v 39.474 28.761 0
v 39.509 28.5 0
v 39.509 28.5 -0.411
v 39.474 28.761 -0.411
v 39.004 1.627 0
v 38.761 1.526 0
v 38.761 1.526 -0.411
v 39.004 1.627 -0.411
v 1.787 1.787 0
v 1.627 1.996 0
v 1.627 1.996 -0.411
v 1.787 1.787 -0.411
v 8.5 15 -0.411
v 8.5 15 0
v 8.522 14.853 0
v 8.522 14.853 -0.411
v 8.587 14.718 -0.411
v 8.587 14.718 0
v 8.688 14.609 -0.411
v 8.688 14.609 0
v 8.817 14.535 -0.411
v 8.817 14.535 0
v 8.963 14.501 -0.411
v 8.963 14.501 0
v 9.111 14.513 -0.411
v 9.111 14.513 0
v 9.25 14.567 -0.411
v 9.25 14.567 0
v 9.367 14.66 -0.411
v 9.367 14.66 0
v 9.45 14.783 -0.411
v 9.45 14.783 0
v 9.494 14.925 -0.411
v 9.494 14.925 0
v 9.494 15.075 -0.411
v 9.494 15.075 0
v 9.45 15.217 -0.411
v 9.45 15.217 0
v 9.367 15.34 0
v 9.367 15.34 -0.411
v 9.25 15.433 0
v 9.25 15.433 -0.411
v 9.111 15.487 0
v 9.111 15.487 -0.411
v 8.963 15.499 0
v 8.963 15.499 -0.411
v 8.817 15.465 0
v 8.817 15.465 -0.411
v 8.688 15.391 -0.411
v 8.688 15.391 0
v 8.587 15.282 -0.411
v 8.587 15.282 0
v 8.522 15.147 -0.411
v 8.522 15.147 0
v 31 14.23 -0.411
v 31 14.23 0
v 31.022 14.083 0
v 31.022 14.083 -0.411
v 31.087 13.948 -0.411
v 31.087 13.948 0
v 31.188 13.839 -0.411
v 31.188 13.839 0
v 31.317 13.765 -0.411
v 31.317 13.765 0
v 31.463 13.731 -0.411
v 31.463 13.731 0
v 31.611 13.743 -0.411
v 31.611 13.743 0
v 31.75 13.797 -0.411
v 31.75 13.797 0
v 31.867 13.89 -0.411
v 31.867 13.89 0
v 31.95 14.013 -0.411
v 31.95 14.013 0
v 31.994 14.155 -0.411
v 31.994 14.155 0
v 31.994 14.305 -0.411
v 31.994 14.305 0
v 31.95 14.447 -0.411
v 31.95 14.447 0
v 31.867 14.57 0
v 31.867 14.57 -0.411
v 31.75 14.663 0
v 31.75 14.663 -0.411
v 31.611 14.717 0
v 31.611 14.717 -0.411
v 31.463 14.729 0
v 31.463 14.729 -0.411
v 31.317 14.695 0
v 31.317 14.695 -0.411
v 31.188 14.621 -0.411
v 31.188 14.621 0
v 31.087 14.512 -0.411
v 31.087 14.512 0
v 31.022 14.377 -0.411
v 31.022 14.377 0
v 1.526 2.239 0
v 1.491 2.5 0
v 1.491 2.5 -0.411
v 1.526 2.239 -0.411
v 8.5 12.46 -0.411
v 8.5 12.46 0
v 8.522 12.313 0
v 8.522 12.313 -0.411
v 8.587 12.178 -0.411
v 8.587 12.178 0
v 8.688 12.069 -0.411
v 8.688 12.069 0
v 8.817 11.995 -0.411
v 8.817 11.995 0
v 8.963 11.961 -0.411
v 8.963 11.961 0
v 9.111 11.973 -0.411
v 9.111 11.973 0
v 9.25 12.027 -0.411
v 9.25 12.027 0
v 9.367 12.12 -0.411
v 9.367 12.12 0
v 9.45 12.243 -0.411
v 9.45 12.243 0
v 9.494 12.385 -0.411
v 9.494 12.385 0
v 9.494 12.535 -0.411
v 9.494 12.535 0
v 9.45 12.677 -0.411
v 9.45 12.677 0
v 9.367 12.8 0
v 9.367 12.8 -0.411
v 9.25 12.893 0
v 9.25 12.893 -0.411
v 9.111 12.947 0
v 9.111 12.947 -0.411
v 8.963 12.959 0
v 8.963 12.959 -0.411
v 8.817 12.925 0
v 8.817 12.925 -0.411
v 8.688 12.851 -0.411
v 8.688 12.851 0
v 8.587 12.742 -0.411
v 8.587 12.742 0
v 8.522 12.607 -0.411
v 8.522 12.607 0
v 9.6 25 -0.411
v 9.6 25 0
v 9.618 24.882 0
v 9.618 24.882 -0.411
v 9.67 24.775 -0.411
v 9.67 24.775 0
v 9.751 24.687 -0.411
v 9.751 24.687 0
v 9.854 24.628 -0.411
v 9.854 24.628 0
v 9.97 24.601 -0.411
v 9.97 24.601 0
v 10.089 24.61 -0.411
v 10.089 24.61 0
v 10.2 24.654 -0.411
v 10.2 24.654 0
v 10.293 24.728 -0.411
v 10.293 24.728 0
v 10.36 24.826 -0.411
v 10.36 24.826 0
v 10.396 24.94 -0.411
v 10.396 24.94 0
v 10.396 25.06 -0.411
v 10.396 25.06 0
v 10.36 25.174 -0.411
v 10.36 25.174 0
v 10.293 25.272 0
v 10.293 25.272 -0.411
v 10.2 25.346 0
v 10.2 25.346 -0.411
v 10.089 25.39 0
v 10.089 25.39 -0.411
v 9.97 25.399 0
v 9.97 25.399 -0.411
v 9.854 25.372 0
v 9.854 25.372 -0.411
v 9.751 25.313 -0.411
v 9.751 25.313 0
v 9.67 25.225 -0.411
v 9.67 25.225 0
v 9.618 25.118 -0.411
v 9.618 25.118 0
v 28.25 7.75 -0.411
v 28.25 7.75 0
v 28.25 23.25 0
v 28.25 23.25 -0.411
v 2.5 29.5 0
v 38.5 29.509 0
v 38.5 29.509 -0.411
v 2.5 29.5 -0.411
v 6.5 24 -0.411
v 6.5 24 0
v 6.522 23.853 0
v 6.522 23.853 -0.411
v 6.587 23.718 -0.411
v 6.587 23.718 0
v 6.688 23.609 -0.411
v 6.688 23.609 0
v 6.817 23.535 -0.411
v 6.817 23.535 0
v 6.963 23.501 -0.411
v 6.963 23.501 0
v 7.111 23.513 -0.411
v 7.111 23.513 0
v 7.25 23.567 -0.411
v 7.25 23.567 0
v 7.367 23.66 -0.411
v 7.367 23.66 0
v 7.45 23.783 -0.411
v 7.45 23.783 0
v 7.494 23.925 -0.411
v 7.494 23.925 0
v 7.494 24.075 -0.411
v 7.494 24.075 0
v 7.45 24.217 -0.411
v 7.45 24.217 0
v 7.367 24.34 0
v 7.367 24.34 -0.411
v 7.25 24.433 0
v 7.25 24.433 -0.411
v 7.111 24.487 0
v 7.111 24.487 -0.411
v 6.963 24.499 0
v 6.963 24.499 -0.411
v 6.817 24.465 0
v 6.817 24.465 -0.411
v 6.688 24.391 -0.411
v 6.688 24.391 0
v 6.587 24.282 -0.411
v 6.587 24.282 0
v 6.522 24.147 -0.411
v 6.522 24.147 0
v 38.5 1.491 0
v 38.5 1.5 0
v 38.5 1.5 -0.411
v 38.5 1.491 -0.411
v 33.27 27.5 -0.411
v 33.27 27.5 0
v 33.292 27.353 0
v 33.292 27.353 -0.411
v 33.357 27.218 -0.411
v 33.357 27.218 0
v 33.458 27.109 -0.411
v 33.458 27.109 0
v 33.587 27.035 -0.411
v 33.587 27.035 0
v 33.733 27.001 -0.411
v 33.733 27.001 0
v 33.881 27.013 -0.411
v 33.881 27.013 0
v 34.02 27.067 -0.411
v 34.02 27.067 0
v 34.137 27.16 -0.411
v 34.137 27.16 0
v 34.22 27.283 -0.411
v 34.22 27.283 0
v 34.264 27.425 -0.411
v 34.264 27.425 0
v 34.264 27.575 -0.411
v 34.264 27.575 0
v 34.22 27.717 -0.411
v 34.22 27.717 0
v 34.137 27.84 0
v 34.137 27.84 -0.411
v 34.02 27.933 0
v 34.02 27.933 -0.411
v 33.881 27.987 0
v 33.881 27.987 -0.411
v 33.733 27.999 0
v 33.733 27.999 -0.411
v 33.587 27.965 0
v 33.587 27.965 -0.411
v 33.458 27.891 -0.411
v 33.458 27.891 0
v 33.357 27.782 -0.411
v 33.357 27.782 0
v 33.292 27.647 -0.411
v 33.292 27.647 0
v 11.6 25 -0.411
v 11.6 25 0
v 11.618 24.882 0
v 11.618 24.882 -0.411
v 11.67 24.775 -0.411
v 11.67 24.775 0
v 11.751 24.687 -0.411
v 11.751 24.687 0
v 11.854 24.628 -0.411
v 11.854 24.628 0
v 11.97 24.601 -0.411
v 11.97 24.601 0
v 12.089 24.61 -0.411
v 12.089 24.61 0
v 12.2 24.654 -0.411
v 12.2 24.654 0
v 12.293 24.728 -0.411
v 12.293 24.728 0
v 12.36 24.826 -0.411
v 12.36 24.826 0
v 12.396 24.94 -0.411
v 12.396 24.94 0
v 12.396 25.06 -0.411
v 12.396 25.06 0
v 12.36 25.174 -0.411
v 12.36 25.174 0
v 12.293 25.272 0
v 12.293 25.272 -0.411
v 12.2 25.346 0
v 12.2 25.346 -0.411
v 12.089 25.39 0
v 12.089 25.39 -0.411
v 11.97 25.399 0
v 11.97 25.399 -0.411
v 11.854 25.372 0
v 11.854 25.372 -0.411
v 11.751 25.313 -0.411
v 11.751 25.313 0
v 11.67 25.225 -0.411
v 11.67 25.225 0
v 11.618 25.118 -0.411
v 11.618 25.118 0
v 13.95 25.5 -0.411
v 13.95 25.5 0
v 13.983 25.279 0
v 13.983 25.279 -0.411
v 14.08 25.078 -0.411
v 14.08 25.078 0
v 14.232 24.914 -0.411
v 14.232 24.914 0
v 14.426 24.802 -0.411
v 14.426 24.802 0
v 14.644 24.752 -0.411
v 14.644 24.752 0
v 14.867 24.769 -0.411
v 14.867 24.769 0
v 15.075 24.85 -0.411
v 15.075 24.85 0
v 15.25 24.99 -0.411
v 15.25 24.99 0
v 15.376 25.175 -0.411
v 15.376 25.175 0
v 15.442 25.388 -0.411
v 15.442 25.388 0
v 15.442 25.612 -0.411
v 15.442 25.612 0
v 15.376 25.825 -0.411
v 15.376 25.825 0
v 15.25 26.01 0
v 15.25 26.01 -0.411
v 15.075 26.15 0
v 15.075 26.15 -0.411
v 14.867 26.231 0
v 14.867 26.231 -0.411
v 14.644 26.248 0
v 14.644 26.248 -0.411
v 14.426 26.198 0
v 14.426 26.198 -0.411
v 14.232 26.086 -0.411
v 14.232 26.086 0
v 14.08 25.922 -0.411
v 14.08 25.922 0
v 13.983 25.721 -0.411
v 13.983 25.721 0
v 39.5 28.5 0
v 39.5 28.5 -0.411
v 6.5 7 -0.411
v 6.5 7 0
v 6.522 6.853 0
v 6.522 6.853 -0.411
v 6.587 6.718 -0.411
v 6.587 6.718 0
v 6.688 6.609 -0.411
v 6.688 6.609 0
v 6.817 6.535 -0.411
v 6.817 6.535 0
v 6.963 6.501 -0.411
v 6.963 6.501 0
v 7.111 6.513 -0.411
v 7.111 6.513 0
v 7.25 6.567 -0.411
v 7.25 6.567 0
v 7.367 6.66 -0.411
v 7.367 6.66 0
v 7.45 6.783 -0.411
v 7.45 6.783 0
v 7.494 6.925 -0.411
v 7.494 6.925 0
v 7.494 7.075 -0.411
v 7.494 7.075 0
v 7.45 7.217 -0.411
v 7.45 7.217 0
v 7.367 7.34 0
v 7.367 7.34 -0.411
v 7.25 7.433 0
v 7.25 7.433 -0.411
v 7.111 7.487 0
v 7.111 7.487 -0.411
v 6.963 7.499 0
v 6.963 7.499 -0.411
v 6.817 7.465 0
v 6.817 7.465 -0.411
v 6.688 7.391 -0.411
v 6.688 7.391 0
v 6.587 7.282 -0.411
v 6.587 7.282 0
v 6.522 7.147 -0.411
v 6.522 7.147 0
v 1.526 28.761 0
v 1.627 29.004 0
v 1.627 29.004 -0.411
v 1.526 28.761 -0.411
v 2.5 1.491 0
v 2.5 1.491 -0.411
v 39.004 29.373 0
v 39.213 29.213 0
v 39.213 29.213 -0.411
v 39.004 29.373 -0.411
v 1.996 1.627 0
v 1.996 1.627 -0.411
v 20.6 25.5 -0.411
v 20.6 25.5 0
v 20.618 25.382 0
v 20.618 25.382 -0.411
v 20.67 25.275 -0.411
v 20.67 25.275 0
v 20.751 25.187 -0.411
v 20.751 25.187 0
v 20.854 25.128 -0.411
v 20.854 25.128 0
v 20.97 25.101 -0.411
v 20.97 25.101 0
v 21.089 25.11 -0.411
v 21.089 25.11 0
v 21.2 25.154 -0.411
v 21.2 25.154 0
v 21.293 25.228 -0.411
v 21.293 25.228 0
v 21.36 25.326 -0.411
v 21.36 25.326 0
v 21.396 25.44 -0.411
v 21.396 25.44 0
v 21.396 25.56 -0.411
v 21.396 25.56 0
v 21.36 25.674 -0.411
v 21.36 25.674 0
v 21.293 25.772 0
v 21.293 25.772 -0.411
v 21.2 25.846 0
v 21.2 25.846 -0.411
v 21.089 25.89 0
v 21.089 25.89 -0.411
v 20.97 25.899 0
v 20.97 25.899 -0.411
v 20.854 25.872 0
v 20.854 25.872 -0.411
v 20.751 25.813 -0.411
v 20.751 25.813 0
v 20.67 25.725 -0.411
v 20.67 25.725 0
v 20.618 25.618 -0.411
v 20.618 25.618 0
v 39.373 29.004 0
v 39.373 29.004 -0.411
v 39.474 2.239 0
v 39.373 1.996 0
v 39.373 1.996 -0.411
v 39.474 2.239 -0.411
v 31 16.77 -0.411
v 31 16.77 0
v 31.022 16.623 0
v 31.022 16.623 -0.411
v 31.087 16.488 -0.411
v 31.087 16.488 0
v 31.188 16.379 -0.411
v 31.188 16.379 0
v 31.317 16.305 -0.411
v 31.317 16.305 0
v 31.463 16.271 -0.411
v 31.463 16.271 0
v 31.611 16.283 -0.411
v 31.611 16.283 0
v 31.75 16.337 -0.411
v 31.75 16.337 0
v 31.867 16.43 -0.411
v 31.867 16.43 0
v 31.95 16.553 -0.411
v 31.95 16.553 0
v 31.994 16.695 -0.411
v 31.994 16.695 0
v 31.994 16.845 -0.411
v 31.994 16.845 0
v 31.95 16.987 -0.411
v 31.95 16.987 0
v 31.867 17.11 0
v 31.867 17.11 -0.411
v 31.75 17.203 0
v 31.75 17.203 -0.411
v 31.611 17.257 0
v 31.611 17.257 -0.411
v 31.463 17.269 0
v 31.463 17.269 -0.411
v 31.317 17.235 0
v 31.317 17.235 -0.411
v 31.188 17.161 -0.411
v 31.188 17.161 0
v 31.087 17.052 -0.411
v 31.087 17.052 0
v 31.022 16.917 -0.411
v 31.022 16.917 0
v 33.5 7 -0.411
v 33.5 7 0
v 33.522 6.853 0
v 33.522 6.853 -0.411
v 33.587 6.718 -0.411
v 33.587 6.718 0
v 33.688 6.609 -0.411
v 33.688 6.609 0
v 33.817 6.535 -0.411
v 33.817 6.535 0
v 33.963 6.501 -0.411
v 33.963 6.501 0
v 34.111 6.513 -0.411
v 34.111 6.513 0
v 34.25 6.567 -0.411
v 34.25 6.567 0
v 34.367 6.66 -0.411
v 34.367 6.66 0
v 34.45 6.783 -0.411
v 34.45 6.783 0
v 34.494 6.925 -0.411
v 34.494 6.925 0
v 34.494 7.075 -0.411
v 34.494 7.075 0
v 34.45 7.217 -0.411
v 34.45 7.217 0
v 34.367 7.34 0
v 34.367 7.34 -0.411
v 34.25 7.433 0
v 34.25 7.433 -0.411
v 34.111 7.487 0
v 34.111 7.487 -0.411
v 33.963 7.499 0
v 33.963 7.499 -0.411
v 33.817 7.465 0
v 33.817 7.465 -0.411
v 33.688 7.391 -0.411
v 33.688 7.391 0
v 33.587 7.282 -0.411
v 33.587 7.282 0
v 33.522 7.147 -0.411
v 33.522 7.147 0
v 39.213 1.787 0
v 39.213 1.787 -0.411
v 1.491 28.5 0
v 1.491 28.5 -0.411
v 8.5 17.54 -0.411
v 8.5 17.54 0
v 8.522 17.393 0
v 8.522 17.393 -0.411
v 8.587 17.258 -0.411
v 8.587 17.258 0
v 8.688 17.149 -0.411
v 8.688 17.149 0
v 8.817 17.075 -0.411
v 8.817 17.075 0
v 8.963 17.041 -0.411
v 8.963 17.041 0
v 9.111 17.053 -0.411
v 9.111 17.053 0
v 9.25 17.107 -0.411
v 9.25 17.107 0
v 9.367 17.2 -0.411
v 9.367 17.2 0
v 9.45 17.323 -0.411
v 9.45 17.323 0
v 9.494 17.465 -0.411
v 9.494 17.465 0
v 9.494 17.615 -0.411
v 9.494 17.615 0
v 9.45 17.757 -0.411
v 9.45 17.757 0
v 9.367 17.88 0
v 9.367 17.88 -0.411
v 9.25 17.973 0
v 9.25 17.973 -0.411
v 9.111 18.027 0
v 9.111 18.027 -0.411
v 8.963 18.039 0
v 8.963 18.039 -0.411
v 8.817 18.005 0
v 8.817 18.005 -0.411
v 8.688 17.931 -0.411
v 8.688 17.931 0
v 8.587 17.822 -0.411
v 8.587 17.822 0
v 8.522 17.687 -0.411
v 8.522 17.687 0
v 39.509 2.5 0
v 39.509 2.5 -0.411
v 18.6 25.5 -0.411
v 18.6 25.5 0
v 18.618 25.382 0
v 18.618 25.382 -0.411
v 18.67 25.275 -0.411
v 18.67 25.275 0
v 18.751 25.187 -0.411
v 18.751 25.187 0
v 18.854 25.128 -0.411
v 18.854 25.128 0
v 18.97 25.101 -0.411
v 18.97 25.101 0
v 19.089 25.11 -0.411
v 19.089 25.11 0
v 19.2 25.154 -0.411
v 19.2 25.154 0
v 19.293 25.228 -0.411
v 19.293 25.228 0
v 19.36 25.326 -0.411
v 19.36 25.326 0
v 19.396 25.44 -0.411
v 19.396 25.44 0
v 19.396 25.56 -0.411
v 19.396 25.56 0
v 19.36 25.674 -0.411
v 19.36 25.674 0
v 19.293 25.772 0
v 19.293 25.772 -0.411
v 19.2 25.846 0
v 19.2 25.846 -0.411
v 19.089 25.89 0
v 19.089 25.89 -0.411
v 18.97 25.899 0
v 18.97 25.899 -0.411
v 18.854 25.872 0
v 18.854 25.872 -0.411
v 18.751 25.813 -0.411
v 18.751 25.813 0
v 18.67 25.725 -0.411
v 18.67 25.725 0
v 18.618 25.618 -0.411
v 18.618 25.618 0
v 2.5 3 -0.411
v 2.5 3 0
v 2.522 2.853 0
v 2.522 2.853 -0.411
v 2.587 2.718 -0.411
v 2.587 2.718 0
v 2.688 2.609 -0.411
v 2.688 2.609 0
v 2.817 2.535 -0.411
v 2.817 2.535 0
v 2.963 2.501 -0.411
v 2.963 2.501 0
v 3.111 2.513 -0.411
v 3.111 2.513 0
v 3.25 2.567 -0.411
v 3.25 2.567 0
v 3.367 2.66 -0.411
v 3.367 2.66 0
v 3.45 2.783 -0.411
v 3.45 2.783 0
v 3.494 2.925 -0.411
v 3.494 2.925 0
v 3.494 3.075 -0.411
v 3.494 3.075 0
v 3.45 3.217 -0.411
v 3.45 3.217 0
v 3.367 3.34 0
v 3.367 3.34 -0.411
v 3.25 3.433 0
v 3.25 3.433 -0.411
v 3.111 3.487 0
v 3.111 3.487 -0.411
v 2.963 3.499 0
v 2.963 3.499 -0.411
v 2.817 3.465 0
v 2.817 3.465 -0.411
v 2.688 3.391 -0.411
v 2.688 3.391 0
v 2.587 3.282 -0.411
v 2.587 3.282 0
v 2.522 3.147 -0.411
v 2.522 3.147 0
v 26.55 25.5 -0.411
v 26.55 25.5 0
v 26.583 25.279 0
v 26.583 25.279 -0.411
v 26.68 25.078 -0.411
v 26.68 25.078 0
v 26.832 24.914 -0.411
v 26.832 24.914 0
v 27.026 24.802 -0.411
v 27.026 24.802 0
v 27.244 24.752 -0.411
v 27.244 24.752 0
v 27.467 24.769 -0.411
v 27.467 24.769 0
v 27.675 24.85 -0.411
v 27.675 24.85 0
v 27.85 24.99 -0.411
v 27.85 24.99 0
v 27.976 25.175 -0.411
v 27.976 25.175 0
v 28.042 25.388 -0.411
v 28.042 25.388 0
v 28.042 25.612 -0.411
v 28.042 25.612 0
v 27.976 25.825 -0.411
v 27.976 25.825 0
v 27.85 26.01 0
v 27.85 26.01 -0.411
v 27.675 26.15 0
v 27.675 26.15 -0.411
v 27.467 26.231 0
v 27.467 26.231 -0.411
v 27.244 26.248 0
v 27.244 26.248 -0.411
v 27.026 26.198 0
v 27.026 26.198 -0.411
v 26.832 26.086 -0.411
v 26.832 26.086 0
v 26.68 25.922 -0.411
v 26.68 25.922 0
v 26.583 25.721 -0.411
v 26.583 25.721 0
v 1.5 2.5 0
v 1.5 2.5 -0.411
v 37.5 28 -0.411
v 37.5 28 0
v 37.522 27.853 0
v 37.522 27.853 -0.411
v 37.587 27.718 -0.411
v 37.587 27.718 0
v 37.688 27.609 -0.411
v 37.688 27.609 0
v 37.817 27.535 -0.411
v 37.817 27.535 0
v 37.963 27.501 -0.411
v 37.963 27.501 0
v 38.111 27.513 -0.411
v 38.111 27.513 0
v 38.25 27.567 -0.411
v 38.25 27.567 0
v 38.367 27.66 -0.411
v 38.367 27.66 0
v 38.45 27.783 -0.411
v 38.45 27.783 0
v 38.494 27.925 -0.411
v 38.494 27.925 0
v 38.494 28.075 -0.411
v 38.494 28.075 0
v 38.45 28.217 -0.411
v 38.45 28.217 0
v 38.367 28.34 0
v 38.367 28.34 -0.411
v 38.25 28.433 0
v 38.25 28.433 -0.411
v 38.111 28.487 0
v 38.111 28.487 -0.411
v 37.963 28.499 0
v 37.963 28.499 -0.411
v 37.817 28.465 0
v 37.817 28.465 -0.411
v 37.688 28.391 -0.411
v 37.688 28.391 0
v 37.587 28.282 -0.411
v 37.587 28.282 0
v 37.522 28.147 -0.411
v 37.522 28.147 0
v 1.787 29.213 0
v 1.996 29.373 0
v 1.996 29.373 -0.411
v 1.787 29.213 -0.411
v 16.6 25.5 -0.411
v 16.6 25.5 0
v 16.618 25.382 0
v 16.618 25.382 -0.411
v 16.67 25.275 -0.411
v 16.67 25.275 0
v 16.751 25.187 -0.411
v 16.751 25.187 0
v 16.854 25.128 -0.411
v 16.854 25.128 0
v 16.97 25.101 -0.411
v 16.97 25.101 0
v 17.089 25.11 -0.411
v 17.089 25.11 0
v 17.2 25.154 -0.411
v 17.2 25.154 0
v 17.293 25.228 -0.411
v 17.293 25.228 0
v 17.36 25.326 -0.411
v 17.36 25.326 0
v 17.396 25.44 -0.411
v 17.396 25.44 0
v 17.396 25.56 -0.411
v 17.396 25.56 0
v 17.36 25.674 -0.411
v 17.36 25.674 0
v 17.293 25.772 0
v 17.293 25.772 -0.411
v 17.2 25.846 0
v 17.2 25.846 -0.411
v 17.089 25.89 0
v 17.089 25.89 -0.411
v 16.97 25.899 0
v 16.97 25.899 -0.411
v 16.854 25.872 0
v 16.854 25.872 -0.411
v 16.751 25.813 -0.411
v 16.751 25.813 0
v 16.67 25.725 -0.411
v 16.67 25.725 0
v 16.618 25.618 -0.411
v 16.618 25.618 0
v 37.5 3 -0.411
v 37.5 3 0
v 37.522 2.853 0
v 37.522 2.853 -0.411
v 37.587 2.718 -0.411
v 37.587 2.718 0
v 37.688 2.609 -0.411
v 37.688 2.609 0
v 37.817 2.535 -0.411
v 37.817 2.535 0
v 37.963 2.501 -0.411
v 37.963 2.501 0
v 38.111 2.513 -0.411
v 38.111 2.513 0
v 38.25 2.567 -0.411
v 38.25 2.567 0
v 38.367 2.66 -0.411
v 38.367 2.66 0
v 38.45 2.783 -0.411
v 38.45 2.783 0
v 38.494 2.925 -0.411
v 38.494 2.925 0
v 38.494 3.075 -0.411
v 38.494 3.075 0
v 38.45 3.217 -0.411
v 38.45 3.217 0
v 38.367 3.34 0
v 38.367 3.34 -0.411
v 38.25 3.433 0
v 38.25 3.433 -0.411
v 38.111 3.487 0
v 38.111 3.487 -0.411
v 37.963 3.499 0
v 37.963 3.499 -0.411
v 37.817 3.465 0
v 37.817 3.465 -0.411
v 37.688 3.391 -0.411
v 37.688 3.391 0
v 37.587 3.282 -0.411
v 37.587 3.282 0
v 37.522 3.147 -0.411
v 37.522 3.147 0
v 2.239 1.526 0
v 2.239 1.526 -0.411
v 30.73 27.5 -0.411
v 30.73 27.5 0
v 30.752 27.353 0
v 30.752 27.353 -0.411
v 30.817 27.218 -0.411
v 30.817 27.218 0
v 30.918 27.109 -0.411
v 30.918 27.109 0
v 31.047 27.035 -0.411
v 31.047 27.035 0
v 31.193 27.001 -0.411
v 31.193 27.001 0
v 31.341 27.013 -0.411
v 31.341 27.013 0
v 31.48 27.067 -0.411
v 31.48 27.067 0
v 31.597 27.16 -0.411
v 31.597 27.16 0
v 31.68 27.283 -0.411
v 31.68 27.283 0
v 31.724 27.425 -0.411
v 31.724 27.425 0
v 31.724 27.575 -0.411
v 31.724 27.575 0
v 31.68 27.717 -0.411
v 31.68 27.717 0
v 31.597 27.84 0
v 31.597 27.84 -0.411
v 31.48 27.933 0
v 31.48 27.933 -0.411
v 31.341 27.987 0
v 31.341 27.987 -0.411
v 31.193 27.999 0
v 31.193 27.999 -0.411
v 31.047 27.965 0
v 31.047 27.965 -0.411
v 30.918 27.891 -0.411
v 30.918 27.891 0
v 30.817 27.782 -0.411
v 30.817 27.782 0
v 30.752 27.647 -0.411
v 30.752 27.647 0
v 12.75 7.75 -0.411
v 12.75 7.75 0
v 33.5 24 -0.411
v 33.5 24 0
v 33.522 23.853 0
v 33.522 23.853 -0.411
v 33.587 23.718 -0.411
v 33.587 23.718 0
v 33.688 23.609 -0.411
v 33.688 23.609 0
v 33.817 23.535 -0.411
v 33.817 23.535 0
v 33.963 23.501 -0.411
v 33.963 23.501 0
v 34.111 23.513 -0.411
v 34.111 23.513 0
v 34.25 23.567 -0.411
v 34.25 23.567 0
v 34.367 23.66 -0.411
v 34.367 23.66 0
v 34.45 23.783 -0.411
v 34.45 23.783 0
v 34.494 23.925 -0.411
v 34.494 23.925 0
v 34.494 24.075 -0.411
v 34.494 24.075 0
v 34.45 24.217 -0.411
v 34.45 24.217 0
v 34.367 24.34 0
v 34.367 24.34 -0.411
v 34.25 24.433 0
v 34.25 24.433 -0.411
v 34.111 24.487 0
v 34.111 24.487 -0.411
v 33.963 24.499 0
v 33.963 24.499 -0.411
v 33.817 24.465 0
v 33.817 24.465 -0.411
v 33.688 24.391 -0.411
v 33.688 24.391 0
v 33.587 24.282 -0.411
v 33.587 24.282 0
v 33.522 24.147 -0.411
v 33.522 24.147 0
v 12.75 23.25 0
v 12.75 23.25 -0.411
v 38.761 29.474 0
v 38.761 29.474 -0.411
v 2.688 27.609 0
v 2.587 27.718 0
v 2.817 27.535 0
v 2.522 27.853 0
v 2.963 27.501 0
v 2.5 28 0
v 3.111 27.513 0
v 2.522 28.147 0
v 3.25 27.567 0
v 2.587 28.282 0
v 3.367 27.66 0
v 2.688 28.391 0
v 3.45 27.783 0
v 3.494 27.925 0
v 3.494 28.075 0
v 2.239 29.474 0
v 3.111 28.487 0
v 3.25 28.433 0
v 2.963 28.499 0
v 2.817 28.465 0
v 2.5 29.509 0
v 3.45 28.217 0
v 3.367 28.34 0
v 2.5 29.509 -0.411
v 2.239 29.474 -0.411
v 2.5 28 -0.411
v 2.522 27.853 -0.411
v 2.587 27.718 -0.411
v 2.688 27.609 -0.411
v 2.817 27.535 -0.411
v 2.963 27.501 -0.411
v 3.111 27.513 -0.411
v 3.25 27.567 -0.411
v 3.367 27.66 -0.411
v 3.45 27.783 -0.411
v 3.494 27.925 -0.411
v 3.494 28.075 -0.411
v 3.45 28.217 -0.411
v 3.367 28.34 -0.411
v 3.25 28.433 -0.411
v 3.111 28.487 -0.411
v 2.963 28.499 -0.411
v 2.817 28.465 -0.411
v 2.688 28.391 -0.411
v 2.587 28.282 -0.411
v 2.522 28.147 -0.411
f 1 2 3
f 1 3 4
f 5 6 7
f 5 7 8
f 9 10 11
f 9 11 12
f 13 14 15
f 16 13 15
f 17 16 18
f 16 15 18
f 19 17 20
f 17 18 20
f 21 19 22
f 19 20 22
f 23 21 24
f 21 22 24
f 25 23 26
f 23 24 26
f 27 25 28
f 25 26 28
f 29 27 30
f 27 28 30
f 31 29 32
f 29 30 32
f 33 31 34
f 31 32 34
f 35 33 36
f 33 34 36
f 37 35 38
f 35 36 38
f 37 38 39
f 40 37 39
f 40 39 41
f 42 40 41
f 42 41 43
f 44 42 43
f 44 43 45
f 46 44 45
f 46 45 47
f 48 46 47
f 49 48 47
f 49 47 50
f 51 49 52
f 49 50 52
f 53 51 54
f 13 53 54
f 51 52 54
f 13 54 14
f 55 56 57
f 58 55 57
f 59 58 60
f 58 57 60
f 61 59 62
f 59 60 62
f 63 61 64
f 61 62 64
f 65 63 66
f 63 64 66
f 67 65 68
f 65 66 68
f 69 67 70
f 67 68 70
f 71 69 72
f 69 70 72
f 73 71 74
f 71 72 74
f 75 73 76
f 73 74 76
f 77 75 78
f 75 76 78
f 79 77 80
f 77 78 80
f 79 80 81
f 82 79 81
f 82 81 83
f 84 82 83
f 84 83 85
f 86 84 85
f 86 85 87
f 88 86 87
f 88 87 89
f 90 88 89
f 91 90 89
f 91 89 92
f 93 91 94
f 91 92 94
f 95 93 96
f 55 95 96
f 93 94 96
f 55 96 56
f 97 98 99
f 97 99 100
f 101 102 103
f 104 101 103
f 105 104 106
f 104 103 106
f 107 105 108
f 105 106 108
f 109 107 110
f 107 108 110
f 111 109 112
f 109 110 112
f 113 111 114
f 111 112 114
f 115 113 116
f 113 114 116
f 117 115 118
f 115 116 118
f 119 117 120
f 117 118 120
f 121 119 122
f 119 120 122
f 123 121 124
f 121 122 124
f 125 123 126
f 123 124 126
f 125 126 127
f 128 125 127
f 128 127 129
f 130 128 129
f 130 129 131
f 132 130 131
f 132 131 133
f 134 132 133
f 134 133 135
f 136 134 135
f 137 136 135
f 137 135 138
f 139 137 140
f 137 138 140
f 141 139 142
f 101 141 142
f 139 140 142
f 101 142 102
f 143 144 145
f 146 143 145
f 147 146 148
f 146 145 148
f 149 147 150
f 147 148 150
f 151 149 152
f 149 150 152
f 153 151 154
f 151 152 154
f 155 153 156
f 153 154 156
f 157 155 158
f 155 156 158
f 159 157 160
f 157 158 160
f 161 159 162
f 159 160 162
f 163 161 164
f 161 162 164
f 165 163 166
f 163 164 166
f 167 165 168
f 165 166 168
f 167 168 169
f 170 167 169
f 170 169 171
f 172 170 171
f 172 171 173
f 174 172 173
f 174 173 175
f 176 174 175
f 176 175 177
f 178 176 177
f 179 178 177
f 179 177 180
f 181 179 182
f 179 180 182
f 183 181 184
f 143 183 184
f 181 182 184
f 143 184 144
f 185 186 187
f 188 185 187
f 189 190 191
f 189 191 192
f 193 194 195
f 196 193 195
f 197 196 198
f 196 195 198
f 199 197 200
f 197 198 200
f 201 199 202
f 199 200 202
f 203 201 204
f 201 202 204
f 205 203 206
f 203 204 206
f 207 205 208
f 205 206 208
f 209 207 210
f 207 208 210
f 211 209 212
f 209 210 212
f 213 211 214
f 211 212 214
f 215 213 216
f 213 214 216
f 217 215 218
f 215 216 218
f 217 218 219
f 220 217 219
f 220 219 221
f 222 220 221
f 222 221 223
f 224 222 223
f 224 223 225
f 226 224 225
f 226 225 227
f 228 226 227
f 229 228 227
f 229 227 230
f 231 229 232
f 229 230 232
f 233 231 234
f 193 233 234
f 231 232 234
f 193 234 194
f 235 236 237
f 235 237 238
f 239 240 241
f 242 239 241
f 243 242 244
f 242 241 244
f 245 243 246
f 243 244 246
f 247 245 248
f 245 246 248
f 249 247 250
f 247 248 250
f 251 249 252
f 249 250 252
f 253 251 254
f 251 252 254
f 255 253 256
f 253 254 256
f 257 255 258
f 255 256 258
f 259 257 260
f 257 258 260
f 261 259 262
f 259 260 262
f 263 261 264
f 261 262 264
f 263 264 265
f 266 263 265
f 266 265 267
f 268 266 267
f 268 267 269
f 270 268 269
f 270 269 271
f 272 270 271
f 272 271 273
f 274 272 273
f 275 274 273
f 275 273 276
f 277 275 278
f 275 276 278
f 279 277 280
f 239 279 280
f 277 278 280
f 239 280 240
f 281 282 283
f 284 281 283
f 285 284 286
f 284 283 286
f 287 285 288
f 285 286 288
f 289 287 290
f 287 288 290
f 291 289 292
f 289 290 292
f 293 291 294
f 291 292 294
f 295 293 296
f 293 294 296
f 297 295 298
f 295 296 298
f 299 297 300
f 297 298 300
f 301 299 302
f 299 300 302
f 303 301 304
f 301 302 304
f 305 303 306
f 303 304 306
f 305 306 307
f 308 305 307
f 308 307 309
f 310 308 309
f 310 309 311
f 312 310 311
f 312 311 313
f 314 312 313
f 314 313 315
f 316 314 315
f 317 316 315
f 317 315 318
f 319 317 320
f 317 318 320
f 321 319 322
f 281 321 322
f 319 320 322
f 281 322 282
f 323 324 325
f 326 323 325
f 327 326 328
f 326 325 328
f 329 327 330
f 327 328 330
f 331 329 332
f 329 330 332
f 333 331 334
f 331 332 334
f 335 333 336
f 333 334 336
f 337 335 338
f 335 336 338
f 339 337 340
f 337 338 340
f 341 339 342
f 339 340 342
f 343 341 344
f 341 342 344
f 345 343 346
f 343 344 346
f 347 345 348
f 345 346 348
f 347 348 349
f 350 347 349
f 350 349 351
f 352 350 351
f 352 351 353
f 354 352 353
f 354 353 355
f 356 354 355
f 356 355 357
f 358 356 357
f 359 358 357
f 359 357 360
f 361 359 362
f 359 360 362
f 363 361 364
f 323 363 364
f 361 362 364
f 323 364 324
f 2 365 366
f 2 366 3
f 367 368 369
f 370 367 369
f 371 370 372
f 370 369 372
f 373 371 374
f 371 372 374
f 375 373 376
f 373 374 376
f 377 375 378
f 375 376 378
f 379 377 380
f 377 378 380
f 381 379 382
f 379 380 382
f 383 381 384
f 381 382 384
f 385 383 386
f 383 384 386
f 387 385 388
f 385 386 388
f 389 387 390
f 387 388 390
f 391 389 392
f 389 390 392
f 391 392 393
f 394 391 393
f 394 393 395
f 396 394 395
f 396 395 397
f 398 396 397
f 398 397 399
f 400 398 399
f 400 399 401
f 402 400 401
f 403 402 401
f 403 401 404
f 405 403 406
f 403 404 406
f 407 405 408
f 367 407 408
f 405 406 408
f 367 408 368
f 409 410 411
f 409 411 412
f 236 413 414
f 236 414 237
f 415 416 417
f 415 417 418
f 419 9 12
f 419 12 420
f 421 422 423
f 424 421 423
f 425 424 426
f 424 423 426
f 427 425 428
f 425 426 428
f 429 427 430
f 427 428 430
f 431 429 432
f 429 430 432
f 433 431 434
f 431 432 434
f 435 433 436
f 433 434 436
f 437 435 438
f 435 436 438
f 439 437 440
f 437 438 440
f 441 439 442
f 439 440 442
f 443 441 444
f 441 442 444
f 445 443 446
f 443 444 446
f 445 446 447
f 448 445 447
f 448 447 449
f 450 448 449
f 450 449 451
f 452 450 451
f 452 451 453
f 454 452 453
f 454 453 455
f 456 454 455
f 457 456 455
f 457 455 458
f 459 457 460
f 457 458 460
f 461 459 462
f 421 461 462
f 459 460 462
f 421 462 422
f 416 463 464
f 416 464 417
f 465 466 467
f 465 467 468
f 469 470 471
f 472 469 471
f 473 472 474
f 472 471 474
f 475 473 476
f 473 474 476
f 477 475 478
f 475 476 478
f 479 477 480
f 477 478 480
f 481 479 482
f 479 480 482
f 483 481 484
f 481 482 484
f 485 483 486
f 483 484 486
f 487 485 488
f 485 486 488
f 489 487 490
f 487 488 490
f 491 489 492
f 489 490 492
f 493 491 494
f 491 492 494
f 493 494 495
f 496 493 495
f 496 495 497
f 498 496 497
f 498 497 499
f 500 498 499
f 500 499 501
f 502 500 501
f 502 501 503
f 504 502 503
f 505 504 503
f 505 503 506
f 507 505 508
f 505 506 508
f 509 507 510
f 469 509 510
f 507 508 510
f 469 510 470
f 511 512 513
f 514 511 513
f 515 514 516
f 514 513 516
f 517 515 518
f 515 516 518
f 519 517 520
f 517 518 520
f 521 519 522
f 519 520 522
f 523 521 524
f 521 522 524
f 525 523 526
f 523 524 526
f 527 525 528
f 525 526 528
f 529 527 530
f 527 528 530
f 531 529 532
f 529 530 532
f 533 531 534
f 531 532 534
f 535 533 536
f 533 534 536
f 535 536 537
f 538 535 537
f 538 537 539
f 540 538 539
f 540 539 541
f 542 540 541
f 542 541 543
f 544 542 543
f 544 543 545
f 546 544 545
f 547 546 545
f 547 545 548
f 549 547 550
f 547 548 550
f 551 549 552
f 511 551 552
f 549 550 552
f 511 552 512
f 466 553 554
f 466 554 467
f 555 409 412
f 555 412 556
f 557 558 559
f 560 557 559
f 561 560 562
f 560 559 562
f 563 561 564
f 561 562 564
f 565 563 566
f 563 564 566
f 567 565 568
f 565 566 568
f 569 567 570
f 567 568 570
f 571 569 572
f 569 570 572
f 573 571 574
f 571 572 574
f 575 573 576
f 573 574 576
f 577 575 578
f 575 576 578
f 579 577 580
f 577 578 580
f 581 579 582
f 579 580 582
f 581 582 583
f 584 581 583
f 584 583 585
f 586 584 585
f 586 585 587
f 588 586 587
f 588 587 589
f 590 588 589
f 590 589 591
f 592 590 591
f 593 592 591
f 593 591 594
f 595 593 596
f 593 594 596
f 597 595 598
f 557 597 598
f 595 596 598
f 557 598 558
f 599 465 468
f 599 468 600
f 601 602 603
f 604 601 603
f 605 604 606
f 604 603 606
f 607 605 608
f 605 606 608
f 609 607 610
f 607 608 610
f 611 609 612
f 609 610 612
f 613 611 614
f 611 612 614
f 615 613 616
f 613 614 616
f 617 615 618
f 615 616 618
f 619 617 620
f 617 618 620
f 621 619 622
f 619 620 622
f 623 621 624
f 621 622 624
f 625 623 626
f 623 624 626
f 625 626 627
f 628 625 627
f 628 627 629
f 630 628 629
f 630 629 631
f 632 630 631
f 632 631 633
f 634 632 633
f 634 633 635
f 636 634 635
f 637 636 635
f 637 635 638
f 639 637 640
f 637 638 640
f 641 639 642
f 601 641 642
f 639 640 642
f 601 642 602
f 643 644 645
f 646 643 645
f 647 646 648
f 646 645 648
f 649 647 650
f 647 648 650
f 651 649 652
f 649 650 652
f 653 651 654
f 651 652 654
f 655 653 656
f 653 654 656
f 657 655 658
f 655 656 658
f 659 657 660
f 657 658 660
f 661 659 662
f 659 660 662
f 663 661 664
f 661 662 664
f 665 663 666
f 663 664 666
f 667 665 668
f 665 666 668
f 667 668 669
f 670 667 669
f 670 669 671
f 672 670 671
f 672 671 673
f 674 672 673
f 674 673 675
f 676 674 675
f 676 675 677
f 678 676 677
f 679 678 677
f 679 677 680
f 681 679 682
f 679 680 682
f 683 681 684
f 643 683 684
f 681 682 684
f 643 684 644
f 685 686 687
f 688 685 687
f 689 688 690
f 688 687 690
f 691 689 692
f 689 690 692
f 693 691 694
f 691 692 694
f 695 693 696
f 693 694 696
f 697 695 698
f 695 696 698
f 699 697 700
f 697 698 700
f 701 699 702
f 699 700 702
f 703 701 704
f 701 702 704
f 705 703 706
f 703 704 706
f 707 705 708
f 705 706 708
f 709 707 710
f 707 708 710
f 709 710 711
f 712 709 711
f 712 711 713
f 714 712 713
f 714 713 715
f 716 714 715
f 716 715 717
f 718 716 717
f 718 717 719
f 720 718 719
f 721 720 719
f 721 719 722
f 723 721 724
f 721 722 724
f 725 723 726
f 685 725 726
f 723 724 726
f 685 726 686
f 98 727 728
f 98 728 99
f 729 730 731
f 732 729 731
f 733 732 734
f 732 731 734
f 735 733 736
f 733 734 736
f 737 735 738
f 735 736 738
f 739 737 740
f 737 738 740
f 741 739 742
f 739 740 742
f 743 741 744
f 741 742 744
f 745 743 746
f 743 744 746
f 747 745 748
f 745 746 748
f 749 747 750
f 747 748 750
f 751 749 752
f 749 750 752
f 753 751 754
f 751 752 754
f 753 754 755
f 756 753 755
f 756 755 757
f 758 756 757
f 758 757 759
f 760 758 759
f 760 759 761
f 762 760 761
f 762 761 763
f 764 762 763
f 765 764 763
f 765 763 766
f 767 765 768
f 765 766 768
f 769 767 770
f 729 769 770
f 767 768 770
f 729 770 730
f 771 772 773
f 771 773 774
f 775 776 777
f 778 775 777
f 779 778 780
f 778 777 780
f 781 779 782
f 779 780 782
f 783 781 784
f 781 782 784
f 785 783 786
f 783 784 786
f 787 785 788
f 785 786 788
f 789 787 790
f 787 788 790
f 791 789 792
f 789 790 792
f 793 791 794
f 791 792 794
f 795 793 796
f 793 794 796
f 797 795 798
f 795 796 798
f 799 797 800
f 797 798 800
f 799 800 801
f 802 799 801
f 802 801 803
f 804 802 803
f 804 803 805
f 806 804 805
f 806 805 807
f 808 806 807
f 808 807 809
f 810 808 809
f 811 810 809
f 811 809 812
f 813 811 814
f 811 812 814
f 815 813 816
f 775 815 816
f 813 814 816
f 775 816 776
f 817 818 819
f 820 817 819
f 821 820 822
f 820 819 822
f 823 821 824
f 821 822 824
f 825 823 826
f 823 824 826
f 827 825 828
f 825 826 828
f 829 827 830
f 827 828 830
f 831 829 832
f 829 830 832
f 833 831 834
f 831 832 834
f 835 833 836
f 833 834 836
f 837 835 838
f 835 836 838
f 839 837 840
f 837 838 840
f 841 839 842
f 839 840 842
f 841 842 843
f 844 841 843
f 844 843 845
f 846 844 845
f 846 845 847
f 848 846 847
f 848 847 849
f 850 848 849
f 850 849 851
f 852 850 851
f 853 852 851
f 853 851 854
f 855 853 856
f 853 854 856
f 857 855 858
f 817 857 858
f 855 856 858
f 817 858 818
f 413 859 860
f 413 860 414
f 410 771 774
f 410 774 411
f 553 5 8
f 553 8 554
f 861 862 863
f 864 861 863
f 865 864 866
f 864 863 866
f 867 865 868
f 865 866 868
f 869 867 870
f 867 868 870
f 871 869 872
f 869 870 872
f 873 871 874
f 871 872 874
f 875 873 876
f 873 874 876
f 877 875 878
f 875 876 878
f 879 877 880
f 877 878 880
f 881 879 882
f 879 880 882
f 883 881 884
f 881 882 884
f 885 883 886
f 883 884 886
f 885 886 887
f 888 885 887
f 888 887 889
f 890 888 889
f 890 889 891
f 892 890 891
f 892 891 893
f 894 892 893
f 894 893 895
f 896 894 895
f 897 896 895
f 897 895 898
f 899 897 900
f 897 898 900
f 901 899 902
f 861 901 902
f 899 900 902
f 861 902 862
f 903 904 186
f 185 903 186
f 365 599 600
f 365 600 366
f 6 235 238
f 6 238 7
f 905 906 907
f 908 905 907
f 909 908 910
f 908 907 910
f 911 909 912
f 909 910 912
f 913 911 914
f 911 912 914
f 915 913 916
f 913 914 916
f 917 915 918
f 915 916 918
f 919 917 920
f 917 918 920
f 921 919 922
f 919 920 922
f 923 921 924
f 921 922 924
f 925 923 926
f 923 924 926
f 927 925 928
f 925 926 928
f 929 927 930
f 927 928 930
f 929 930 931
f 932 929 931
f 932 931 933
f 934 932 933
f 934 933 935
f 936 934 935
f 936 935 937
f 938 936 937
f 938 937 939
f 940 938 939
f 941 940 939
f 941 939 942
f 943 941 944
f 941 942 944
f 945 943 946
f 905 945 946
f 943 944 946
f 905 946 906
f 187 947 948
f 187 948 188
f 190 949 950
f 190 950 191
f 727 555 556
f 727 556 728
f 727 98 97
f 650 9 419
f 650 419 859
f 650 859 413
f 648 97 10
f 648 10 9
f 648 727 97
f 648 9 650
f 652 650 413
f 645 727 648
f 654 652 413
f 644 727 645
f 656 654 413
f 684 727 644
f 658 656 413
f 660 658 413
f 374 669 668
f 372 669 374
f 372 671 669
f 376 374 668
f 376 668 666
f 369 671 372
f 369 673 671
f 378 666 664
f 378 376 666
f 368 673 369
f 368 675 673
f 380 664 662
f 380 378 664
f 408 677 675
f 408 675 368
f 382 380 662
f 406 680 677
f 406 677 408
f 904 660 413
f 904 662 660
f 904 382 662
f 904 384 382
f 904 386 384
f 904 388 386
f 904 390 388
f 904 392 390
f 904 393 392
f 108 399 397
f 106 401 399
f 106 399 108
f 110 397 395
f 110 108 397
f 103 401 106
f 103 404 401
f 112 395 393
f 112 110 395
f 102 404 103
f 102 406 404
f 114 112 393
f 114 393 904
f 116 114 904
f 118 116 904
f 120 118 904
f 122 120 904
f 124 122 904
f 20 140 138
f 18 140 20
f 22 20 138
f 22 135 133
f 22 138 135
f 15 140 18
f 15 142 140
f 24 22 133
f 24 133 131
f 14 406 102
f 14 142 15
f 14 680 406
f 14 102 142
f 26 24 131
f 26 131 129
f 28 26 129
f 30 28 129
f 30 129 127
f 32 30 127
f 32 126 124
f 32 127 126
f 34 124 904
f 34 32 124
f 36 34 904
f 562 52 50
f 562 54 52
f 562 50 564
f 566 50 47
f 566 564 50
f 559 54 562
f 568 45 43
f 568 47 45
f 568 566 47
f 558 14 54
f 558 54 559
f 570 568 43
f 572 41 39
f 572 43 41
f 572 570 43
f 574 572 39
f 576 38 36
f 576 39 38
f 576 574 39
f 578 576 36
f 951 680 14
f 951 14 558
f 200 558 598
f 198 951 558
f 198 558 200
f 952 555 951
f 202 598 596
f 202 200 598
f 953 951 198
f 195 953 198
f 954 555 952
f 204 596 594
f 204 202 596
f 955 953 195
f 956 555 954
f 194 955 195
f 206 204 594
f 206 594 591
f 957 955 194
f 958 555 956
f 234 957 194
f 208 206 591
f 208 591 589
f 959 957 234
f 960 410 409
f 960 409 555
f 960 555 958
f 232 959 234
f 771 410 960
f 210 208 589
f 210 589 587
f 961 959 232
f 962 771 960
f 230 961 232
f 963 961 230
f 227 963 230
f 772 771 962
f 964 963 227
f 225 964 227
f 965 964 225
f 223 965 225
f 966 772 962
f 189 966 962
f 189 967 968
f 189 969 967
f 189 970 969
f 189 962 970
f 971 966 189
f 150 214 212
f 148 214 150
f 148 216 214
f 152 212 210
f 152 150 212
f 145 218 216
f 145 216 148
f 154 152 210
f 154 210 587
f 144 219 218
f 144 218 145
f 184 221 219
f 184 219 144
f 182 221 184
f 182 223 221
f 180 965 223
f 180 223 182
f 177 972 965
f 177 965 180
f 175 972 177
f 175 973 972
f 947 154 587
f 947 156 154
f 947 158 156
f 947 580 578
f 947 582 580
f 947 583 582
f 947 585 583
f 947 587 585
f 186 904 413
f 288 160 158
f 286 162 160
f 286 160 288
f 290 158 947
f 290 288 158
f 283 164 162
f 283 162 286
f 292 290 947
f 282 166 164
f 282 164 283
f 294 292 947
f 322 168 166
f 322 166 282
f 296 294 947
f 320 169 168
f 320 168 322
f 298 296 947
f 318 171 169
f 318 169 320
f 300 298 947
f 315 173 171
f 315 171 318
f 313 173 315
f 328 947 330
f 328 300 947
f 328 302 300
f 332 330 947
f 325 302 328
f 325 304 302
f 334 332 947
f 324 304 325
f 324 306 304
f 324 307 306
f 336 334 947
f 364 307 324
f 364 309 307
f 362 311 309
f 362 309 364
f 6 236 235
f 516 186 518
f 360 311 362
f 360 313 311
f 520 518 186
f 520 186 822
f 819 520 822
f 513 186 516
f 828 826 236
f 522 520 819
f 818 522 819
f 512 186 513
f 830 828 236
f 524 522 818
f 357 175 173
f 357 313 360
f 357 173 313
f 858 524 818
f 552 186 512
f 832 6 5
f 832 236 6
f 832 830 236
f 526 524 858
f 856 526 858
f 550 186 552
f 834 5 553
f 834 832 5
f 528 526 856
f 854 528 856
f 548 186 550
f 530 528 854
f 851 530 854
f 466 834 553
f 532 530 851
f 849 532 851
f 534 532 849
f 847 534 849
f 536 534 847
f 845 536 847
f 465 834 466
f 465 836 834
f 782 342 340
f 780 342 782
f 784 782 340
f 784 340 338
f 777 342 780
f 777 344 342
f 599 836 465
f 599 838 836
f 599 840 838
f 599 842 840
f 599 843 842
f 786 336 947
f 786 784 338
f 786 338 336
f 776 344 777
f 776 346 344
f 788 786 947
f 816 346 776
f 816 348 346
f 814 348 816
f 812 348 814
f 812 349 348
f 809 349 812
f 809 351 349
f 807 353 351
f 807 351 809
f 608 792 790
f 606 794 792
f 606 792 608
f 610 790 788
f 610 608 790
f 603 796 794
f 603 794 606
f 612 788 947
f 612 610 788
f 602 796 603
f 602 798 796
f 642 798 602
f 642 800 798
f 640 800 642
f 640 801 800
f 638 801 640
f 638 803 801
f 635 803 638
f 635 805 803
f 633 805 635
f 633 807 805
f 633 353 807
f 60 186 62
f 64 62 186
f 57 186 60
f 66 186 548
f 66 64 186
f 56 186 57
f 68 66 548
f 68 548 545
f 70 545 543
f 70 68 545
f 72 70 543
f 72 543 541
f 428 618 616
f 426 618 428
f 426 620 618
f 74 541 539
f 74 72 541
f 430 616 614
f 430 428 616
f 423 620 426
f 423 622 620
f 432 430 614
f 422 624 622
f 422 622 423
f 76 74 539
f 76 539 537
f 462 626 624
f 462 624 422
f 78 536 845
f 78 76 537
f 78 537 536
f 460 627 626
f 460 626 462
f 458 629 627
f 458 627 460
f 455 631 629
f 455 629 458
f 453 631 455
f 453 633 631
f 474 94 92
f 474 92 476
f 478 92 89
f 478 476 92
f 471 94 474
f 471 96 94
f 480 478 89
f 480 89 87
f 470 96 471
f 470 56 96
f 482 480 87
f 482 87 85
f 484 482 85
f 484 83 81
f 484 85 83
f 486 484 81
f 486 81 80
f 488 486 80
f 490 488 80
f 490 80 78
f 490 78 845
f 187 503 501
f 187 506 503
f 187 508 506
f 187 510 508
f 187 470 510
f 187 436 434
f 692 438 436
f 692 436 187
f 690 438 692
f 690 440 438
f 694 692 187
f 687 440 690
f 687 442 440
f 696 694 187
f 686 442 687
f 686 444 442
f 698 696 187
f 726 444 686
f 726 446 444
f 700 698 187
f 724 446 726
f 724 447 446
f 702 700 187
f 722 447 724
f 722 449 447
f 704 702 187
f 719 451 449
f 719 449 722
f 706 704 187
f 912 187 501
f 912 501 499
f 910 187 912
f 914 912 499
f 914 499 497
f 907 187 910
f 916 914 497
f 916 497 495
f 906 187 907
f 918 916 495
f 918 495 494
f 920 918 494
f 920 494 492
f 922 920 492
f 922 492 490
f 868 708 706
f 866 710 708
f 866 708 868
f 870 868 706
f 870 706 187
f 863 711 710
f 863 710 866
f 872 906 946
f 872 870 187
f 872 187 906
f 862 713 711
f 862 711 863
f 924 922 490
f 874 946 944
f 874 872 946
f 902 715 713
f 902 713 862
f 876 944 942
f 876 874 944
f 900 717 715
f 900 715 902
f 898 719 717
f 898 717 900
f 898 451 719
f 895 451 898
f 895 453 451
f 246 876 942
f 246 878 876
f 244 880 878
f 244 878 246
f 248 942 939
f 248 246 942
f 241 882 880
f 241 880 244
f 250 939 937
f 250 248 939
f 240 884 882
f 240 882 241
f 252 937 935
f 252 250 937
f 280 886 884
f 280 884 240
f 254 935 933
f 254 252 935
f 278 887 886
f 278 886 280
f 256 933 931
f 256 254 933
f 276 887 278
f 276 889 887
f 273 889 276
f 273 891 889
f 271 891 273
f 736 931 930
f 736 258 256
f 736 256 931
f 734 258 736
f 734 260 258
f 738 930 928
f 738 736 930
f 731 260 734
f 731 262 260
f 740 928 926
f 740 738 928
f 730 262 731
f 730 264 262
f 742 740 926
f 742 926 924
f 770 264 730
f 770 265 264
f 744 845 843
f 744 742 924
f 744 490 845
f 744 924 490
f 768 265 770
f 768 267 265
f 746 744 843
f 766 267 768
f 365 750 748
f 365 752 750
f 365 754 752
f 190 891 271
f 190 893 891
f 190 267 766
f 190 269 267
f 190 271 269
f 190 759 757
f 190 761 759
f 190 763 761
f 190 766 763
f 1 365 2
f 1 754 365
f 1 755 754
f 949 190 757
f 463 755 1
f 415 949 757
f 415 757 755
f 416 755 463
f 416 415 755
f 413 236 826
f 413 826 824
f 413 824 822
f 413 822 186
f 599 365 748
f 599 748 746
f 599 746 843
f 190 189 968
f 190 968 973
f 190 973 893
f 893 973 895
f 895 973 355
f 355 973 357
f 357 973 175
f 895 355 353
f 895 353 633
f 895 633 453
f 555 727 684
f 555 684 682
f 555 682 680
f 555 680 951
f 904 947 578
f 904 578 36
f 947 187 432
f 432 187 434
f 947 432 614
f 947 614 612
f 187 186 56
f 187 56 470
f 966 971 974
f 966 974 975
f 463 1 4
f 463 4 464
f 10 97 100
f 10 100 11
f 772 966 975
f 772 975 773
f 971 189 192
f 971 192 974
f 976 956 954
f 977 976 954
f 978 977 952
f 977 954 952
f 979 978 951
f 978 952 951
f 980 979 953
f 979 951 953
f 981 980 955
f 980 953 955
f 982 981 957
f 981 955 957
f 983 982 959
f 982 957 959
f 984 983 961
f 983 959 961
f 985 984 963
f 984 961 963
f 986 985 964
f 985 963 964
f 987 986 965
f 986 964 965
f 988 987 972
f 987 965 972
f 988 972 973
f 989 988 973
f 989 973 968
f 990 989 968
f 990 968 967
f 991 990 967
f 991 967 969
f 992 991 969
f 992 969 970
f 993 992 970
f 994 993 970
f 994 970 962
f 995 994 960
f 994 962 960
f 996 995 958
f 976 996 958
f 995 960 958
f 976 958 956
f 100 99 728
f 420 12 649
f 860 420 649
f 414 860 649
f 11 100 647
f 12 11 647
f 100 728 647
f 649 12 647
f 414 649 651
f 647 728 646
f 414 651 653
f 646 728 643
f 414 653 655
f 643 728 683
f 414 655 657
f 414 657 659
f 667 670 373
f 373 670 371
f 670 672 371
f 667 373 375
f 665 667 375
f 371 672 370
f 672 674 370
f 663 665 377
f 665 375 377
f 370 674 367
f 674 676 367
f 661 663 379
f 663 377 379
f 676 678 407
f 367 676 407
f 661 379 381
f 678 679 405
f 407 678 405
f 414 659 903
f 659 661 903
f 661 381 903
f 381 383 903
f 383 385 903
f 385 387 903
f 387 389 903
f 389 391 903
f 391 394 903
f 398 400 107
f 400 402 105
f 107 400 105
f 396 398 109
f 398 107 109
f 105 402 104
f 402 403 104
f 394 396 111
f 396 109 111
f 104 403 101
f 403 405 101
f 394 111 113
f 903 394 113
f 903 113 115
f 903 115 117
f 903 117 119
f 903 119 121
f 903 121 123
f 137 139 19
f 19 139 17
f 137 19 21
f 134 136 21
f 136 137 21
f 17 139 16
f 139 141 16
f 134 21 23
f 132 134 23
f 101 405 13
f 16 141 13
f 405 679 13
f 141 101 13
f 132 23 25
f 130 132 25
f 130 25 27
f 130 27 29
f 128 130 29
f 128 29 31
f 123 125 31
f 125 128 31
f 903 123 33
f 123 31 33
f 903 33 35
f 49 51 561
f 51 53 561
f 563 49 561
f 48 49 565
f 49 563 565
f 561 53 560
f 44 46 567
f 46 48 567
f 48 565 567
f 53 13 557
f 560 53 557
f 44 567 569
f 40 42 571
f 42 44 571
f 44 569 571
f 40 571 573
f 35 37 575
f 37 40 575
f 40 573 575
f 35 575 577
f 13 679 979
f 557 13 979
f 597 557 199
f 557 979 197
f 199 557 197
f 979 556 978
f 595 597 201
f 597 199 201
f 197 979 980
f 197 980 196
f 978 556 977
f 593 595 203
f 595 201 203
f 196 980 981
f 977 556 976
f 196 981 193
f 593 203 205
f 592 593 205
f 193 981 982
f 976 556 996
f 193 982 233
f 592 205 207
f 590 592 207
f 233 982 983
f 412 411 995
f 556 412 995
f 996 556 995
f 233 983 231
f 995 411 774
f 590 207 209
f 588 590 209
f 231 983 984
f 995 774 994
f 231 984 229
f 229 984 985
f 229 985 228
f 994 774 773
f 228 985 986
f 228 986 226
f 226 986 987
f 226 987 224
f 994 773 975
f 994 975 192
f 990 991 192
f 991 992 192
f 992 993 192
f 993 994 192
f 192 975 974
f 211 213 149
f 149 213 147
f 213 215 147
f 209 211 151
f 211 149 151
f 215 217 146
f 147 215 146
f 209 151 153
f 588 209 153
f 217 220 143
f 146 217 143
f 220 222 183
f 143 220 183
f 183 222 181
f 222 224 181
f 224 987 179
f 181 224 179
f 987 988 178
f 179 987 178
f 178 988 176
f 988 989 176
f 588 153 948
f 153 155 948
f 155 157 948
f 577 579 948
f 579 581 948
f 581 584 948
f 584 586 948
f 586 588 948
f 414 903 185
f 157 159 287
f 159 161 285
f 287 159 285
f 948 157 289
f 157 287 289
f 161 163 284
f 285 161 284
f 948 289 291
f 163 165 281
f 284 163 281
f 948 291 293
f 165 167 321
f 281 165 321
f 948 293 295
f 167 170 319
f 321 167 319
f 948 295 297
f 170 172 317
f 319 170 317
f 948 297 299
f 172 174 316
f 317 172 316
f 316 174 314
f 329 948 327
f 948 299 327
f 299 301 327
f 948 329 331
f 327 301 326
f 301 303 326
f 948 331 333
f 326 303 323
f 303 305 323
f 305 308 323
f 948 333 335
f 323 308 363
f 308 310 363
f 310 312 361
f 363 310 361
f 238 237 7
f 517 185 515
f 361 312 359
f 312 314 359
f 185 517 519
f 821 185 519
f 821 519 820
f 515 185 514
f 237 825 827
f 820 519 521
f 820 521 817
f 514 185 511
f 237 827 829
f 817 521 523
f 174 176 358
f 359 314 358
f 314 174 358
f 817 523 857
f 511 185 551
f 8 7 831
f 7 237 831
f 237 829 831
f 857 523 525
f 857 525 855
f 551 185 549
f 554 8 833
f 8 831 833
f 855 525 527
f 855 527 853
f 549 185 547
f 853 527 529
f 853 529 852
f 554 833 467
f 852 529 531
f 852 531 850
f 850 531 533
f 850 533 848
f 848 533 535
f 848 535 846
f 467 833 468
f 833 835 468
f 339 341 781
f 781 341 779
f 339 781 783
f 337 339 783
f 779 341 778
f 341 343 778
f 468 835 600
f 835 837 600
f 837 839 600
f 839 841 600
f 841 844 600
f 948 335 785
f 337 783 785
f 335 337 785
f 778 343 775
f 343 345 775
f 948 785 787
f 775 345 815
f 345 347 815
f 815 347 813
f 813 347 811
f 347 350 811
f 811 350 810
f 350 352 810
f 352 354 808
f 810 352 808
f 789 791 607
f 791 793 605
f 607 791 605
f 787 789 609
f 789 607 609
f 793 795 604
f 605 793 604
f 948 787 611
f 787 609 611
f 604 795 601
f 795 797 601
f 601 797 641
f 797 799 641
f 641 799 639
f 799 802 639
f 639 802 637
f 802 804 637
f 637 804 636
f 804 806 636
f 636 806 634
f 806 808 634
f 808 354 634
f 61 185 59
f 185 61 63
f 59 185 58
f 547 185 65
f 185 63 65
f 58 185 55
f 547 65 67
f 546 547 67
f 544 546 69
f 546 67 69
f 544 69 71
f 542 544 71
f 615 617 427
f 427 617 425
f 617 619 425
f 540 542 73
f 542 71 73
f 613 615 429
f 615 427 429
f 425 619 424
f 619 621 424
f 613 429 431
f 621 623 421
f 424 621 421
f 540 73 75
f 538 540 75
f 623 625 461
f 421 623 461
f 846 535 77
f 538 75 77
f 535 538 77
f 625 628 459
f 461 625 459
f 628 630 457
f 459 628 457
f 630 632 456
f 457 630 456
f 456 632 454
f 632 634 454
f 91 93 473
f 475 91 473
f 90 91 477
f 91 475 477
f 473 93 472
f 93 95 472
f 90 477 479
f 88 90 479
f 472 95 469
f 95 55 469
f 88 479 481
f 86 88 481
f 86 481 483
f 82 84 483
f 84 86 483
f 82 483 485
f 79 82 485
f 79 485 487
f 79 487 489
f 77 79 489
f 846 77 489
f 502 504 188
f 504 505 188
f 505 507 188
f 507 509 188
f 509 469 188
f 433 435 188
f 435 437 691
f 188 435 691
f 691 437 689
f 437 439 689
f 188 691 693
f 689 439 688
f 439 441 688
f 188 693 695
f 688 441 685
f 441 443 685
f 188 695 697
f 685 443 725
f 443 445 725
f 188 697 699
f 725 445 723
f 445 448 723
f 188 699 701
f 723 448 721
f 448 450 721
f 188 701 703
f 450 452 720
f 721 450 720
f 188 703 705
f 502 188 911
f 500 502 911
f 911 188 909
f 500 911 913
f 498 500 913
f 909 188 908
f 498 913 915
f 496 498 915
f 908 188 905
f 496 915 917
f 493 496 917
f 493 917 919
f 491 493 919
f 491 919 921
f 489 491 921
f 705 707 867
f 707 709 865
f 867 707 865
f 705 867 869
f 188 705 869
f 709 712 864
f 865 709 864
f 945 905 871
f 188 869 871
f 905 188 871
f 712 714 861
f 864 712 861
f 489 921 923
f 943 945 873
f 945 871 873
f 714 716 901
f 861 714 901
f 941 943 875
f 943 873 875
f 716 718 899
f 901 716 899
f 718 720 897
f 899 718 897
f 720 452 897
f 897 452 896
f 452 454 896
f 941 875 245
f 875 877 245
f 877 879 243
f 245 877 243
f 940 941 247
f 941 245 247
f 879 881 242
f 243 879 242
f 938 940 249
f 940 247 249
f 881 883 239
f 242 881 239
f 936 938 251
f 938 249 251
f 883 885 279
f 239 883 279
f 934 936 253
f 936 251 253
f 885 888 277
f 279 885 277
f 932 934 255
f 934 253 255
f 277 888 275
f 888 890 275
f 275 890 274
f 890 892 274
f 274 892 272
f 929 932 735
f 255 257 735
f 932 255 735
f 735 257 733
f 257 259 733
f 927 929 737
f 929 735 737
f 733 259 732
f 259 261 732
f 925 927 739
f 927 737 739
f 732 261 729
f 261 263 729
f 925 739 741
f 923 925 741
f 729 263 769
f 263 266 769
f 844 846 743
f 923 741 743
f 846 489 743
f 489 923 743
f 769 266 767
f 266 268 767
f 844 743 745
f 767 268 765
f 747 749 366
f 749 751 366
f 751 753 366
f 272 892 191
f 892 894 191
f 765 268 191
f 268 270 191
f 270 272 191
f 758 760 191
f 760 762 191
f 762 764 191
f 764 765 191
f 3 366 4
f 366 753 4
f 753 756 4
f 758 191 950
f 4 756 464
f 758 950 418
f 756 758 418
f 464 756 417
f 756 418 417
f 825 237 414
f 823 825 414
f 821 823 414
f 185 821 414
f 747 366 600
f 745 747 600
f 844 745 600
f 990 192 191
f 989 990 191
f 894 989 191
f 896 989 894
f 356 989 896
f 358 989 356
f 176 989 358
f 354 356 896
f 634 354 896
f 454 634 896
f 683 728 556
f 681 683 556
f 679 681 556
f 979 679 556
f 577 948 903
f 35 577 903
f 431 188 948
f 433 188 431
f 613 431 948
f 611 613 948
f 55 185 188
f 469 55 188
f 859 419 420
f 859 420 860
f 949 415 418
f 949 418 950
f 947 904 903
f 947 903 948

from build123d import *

# Parameters (mm, degrees)
SKETCH_1_R      = 0.499999
SKETCH_1_R_2    = 0.3999992
SKETCH_1_R_3    = 0.7499985
SKETCH_1_W      = 15.49999948
SKETCH_1_H      = 15.49999948
EXTRUDE_1_DEPTH = 0.41148


with BuildPart() as part:
    # 草图1 → 凸台-拉伸1 (new body)
    with BuildSketch(Plane.XY):
        Polygon((1.5257399, 2.2389465), (1.6265017, 1.99568562), (1.78679094, 1.78679094), (1.99568562, 1.6265017), (2.2389465, 1.5257399), (2.50000008, 1.49137116), (38.4999992, 1.49999954), (38.4999992, 1.49137116), (38.76105278, 1.5257399), (39.00431366, 1.6265017), (39.21320834, 1.78679094), (39.37349758, 1.99568562), (39.47425938, 2.2389465), (39.50862812, 2.50000008), (39.49999974, 28.49999888), (39.50862812, 28.49999888), (39.47425938, 28.76105246), (39.37349758, 29.00431334), (39.21320834, 29.21320802), (39.00431366, 29.37349726), (38.76105278, 29.47425906), (38.4999992, 29.5086278), (2.50000008, 29.49999942), (2.50000008, 29.5086278), (2.2389465, 29.47425906), (1.99568562, 29.37349726), (1.78679094, 29.21320802), (1.6265017, 29.00431334), (1.5257399, 28.76105246), (1.49137116, 28.49999888), (1.49999954, 2.50000008), (1.49137116, 2.50000008), align=None)
        with Locations(Location((38.0000002, 27.99999988, 0), (0, 0, 180))):
            Circle(SKETCH_1_R, mode=Mode.SUBTRACT)
        with Locations(Location((33.77000104, 27.50000088, 0), (0, 0, 180))):
            Circle(SKETCH_1_R, mode=Mode.SUBTRACT)
        with Locations(Location((31.23000104, 27.50000088, 0), (0, 0, 180))):
            Circle(SKETCH_1_R, mode=Mode.SUBTRACT)
        with Locations(Location((19.0000001, 25.4999998, 0), (0, 0, 180))):
            Circle(SKETCH_1_R_2, mode=Mode.SUBTRACT)
        with Locations(Location((16.99999902, 25.4999998, 0), (0, 0, 180))):
            Circle(SKETCH_1_R_2, mode=Mode.SUBTRACT)
        with Locations(Location((21.00000118, 25.4999998, 0), (0, 0, 180))):
            Circle(SKETCH_1_R_2, mode=Mode.SUBTRACT)
        with Locations(Location((34.00000058, 7.00000124, 0), (0, 0, 180))):
            Circle(SKETCH_1_R, mode=Mode.SUBTRACT)
        with Locations(Location((34.00000058, 24.00000026, 0), (0, 0, 180))):
            Circle(SKETCH_1_R, mode=Mode.SUBTRACT)
        with Locations(Location((38.0000002, 2.99999908, 0), (0, 0, 180))):
            Circle(SKETCH_1_R, mode=Mode.SUBTRACT)
        with Locations(Location((31.5000005, 16.76999948, 0), (0, 0, 180))):
            Circle(SKETCH_1_R, mode=Mode.SUBTRACT)
        with Locations(Location((27.29999874, 25.4999998, 0), (0, 0, 180))):
            Circle(SKETCH_1_R_3, mode=Mode.SUBTRACT)
        with Locations(Location((31.5000005, 14.22999948, 0), (0, 0, 180))):
            Circle(SKETCH_1_R, mode=Mode.SUBTRACT)
        with Locations(Location((14.70000108, 25.4999998, 0), (0, 0, 180))):
            Circle(SKETCH_1_R_3, mode=Mode.SUBTRACT)
        with Locations(Location((12.0000014, 25.0000008, 0), (0, 0, 180))):
            Circle(SKETCH_1_R_2, mode=Mode.SUBTRACT)
        with Locations(Location((10.00000032, 25.0000008, 0), (0, 0, 180))):
            Circle(SKETCH_1_R_2, mode=Mode.SUBTRACT)
        with Locations(Location((6.9999987, 24.00000026, 0), (0, 0, 180))):
            Circle(SKETCH_1_R, mode=Mode.SUBTRACT)
        with Locations(Location((2.99999908, 27.99999988, 0), (0, 0, 180))):
            Circle(SKETCH_1_R, mode=Mode.SUBTRACT)
        with Locations(Location((8.99999978, 17.54000048, 0), (0, 0, 180))):
            Circle(SKETCH_1_R, mode=Mode.SUBTRACT)
        with Locations(Location((8.99999978, 15.00000048, 0), (0, 0, 180))):
            Circle(SKETCH_1_R, mode=Mode.SUBTRACT)
        with Locations(Location((8.99999978, 12.46000048, 0), (0, 0, 180))):
            Circle(SKETCH_1_R, mode=Mode.SUBTRACT)
        with Locations(Location((6.9999987, 7.00000124, 0), (0, 0, 180))):
            Circle(SKETCH_1_R, mode=Mode.SUBTRACT)
        with Locations(Location((2.99999908, 2.99999908, 0), (0, 0, 180))):
            Circle(SKETCH_1_R, mode=Mode.SUBTRACT)
        with Locations((20.49999964, 15.49999948)):
            Rectangle(SKETCH_1_W, SKETCH_1_H, mode=Mode.SUBTRACT)
    extrude(amount=-EXTRUDE_1_DEPTH)


solid = part.part
